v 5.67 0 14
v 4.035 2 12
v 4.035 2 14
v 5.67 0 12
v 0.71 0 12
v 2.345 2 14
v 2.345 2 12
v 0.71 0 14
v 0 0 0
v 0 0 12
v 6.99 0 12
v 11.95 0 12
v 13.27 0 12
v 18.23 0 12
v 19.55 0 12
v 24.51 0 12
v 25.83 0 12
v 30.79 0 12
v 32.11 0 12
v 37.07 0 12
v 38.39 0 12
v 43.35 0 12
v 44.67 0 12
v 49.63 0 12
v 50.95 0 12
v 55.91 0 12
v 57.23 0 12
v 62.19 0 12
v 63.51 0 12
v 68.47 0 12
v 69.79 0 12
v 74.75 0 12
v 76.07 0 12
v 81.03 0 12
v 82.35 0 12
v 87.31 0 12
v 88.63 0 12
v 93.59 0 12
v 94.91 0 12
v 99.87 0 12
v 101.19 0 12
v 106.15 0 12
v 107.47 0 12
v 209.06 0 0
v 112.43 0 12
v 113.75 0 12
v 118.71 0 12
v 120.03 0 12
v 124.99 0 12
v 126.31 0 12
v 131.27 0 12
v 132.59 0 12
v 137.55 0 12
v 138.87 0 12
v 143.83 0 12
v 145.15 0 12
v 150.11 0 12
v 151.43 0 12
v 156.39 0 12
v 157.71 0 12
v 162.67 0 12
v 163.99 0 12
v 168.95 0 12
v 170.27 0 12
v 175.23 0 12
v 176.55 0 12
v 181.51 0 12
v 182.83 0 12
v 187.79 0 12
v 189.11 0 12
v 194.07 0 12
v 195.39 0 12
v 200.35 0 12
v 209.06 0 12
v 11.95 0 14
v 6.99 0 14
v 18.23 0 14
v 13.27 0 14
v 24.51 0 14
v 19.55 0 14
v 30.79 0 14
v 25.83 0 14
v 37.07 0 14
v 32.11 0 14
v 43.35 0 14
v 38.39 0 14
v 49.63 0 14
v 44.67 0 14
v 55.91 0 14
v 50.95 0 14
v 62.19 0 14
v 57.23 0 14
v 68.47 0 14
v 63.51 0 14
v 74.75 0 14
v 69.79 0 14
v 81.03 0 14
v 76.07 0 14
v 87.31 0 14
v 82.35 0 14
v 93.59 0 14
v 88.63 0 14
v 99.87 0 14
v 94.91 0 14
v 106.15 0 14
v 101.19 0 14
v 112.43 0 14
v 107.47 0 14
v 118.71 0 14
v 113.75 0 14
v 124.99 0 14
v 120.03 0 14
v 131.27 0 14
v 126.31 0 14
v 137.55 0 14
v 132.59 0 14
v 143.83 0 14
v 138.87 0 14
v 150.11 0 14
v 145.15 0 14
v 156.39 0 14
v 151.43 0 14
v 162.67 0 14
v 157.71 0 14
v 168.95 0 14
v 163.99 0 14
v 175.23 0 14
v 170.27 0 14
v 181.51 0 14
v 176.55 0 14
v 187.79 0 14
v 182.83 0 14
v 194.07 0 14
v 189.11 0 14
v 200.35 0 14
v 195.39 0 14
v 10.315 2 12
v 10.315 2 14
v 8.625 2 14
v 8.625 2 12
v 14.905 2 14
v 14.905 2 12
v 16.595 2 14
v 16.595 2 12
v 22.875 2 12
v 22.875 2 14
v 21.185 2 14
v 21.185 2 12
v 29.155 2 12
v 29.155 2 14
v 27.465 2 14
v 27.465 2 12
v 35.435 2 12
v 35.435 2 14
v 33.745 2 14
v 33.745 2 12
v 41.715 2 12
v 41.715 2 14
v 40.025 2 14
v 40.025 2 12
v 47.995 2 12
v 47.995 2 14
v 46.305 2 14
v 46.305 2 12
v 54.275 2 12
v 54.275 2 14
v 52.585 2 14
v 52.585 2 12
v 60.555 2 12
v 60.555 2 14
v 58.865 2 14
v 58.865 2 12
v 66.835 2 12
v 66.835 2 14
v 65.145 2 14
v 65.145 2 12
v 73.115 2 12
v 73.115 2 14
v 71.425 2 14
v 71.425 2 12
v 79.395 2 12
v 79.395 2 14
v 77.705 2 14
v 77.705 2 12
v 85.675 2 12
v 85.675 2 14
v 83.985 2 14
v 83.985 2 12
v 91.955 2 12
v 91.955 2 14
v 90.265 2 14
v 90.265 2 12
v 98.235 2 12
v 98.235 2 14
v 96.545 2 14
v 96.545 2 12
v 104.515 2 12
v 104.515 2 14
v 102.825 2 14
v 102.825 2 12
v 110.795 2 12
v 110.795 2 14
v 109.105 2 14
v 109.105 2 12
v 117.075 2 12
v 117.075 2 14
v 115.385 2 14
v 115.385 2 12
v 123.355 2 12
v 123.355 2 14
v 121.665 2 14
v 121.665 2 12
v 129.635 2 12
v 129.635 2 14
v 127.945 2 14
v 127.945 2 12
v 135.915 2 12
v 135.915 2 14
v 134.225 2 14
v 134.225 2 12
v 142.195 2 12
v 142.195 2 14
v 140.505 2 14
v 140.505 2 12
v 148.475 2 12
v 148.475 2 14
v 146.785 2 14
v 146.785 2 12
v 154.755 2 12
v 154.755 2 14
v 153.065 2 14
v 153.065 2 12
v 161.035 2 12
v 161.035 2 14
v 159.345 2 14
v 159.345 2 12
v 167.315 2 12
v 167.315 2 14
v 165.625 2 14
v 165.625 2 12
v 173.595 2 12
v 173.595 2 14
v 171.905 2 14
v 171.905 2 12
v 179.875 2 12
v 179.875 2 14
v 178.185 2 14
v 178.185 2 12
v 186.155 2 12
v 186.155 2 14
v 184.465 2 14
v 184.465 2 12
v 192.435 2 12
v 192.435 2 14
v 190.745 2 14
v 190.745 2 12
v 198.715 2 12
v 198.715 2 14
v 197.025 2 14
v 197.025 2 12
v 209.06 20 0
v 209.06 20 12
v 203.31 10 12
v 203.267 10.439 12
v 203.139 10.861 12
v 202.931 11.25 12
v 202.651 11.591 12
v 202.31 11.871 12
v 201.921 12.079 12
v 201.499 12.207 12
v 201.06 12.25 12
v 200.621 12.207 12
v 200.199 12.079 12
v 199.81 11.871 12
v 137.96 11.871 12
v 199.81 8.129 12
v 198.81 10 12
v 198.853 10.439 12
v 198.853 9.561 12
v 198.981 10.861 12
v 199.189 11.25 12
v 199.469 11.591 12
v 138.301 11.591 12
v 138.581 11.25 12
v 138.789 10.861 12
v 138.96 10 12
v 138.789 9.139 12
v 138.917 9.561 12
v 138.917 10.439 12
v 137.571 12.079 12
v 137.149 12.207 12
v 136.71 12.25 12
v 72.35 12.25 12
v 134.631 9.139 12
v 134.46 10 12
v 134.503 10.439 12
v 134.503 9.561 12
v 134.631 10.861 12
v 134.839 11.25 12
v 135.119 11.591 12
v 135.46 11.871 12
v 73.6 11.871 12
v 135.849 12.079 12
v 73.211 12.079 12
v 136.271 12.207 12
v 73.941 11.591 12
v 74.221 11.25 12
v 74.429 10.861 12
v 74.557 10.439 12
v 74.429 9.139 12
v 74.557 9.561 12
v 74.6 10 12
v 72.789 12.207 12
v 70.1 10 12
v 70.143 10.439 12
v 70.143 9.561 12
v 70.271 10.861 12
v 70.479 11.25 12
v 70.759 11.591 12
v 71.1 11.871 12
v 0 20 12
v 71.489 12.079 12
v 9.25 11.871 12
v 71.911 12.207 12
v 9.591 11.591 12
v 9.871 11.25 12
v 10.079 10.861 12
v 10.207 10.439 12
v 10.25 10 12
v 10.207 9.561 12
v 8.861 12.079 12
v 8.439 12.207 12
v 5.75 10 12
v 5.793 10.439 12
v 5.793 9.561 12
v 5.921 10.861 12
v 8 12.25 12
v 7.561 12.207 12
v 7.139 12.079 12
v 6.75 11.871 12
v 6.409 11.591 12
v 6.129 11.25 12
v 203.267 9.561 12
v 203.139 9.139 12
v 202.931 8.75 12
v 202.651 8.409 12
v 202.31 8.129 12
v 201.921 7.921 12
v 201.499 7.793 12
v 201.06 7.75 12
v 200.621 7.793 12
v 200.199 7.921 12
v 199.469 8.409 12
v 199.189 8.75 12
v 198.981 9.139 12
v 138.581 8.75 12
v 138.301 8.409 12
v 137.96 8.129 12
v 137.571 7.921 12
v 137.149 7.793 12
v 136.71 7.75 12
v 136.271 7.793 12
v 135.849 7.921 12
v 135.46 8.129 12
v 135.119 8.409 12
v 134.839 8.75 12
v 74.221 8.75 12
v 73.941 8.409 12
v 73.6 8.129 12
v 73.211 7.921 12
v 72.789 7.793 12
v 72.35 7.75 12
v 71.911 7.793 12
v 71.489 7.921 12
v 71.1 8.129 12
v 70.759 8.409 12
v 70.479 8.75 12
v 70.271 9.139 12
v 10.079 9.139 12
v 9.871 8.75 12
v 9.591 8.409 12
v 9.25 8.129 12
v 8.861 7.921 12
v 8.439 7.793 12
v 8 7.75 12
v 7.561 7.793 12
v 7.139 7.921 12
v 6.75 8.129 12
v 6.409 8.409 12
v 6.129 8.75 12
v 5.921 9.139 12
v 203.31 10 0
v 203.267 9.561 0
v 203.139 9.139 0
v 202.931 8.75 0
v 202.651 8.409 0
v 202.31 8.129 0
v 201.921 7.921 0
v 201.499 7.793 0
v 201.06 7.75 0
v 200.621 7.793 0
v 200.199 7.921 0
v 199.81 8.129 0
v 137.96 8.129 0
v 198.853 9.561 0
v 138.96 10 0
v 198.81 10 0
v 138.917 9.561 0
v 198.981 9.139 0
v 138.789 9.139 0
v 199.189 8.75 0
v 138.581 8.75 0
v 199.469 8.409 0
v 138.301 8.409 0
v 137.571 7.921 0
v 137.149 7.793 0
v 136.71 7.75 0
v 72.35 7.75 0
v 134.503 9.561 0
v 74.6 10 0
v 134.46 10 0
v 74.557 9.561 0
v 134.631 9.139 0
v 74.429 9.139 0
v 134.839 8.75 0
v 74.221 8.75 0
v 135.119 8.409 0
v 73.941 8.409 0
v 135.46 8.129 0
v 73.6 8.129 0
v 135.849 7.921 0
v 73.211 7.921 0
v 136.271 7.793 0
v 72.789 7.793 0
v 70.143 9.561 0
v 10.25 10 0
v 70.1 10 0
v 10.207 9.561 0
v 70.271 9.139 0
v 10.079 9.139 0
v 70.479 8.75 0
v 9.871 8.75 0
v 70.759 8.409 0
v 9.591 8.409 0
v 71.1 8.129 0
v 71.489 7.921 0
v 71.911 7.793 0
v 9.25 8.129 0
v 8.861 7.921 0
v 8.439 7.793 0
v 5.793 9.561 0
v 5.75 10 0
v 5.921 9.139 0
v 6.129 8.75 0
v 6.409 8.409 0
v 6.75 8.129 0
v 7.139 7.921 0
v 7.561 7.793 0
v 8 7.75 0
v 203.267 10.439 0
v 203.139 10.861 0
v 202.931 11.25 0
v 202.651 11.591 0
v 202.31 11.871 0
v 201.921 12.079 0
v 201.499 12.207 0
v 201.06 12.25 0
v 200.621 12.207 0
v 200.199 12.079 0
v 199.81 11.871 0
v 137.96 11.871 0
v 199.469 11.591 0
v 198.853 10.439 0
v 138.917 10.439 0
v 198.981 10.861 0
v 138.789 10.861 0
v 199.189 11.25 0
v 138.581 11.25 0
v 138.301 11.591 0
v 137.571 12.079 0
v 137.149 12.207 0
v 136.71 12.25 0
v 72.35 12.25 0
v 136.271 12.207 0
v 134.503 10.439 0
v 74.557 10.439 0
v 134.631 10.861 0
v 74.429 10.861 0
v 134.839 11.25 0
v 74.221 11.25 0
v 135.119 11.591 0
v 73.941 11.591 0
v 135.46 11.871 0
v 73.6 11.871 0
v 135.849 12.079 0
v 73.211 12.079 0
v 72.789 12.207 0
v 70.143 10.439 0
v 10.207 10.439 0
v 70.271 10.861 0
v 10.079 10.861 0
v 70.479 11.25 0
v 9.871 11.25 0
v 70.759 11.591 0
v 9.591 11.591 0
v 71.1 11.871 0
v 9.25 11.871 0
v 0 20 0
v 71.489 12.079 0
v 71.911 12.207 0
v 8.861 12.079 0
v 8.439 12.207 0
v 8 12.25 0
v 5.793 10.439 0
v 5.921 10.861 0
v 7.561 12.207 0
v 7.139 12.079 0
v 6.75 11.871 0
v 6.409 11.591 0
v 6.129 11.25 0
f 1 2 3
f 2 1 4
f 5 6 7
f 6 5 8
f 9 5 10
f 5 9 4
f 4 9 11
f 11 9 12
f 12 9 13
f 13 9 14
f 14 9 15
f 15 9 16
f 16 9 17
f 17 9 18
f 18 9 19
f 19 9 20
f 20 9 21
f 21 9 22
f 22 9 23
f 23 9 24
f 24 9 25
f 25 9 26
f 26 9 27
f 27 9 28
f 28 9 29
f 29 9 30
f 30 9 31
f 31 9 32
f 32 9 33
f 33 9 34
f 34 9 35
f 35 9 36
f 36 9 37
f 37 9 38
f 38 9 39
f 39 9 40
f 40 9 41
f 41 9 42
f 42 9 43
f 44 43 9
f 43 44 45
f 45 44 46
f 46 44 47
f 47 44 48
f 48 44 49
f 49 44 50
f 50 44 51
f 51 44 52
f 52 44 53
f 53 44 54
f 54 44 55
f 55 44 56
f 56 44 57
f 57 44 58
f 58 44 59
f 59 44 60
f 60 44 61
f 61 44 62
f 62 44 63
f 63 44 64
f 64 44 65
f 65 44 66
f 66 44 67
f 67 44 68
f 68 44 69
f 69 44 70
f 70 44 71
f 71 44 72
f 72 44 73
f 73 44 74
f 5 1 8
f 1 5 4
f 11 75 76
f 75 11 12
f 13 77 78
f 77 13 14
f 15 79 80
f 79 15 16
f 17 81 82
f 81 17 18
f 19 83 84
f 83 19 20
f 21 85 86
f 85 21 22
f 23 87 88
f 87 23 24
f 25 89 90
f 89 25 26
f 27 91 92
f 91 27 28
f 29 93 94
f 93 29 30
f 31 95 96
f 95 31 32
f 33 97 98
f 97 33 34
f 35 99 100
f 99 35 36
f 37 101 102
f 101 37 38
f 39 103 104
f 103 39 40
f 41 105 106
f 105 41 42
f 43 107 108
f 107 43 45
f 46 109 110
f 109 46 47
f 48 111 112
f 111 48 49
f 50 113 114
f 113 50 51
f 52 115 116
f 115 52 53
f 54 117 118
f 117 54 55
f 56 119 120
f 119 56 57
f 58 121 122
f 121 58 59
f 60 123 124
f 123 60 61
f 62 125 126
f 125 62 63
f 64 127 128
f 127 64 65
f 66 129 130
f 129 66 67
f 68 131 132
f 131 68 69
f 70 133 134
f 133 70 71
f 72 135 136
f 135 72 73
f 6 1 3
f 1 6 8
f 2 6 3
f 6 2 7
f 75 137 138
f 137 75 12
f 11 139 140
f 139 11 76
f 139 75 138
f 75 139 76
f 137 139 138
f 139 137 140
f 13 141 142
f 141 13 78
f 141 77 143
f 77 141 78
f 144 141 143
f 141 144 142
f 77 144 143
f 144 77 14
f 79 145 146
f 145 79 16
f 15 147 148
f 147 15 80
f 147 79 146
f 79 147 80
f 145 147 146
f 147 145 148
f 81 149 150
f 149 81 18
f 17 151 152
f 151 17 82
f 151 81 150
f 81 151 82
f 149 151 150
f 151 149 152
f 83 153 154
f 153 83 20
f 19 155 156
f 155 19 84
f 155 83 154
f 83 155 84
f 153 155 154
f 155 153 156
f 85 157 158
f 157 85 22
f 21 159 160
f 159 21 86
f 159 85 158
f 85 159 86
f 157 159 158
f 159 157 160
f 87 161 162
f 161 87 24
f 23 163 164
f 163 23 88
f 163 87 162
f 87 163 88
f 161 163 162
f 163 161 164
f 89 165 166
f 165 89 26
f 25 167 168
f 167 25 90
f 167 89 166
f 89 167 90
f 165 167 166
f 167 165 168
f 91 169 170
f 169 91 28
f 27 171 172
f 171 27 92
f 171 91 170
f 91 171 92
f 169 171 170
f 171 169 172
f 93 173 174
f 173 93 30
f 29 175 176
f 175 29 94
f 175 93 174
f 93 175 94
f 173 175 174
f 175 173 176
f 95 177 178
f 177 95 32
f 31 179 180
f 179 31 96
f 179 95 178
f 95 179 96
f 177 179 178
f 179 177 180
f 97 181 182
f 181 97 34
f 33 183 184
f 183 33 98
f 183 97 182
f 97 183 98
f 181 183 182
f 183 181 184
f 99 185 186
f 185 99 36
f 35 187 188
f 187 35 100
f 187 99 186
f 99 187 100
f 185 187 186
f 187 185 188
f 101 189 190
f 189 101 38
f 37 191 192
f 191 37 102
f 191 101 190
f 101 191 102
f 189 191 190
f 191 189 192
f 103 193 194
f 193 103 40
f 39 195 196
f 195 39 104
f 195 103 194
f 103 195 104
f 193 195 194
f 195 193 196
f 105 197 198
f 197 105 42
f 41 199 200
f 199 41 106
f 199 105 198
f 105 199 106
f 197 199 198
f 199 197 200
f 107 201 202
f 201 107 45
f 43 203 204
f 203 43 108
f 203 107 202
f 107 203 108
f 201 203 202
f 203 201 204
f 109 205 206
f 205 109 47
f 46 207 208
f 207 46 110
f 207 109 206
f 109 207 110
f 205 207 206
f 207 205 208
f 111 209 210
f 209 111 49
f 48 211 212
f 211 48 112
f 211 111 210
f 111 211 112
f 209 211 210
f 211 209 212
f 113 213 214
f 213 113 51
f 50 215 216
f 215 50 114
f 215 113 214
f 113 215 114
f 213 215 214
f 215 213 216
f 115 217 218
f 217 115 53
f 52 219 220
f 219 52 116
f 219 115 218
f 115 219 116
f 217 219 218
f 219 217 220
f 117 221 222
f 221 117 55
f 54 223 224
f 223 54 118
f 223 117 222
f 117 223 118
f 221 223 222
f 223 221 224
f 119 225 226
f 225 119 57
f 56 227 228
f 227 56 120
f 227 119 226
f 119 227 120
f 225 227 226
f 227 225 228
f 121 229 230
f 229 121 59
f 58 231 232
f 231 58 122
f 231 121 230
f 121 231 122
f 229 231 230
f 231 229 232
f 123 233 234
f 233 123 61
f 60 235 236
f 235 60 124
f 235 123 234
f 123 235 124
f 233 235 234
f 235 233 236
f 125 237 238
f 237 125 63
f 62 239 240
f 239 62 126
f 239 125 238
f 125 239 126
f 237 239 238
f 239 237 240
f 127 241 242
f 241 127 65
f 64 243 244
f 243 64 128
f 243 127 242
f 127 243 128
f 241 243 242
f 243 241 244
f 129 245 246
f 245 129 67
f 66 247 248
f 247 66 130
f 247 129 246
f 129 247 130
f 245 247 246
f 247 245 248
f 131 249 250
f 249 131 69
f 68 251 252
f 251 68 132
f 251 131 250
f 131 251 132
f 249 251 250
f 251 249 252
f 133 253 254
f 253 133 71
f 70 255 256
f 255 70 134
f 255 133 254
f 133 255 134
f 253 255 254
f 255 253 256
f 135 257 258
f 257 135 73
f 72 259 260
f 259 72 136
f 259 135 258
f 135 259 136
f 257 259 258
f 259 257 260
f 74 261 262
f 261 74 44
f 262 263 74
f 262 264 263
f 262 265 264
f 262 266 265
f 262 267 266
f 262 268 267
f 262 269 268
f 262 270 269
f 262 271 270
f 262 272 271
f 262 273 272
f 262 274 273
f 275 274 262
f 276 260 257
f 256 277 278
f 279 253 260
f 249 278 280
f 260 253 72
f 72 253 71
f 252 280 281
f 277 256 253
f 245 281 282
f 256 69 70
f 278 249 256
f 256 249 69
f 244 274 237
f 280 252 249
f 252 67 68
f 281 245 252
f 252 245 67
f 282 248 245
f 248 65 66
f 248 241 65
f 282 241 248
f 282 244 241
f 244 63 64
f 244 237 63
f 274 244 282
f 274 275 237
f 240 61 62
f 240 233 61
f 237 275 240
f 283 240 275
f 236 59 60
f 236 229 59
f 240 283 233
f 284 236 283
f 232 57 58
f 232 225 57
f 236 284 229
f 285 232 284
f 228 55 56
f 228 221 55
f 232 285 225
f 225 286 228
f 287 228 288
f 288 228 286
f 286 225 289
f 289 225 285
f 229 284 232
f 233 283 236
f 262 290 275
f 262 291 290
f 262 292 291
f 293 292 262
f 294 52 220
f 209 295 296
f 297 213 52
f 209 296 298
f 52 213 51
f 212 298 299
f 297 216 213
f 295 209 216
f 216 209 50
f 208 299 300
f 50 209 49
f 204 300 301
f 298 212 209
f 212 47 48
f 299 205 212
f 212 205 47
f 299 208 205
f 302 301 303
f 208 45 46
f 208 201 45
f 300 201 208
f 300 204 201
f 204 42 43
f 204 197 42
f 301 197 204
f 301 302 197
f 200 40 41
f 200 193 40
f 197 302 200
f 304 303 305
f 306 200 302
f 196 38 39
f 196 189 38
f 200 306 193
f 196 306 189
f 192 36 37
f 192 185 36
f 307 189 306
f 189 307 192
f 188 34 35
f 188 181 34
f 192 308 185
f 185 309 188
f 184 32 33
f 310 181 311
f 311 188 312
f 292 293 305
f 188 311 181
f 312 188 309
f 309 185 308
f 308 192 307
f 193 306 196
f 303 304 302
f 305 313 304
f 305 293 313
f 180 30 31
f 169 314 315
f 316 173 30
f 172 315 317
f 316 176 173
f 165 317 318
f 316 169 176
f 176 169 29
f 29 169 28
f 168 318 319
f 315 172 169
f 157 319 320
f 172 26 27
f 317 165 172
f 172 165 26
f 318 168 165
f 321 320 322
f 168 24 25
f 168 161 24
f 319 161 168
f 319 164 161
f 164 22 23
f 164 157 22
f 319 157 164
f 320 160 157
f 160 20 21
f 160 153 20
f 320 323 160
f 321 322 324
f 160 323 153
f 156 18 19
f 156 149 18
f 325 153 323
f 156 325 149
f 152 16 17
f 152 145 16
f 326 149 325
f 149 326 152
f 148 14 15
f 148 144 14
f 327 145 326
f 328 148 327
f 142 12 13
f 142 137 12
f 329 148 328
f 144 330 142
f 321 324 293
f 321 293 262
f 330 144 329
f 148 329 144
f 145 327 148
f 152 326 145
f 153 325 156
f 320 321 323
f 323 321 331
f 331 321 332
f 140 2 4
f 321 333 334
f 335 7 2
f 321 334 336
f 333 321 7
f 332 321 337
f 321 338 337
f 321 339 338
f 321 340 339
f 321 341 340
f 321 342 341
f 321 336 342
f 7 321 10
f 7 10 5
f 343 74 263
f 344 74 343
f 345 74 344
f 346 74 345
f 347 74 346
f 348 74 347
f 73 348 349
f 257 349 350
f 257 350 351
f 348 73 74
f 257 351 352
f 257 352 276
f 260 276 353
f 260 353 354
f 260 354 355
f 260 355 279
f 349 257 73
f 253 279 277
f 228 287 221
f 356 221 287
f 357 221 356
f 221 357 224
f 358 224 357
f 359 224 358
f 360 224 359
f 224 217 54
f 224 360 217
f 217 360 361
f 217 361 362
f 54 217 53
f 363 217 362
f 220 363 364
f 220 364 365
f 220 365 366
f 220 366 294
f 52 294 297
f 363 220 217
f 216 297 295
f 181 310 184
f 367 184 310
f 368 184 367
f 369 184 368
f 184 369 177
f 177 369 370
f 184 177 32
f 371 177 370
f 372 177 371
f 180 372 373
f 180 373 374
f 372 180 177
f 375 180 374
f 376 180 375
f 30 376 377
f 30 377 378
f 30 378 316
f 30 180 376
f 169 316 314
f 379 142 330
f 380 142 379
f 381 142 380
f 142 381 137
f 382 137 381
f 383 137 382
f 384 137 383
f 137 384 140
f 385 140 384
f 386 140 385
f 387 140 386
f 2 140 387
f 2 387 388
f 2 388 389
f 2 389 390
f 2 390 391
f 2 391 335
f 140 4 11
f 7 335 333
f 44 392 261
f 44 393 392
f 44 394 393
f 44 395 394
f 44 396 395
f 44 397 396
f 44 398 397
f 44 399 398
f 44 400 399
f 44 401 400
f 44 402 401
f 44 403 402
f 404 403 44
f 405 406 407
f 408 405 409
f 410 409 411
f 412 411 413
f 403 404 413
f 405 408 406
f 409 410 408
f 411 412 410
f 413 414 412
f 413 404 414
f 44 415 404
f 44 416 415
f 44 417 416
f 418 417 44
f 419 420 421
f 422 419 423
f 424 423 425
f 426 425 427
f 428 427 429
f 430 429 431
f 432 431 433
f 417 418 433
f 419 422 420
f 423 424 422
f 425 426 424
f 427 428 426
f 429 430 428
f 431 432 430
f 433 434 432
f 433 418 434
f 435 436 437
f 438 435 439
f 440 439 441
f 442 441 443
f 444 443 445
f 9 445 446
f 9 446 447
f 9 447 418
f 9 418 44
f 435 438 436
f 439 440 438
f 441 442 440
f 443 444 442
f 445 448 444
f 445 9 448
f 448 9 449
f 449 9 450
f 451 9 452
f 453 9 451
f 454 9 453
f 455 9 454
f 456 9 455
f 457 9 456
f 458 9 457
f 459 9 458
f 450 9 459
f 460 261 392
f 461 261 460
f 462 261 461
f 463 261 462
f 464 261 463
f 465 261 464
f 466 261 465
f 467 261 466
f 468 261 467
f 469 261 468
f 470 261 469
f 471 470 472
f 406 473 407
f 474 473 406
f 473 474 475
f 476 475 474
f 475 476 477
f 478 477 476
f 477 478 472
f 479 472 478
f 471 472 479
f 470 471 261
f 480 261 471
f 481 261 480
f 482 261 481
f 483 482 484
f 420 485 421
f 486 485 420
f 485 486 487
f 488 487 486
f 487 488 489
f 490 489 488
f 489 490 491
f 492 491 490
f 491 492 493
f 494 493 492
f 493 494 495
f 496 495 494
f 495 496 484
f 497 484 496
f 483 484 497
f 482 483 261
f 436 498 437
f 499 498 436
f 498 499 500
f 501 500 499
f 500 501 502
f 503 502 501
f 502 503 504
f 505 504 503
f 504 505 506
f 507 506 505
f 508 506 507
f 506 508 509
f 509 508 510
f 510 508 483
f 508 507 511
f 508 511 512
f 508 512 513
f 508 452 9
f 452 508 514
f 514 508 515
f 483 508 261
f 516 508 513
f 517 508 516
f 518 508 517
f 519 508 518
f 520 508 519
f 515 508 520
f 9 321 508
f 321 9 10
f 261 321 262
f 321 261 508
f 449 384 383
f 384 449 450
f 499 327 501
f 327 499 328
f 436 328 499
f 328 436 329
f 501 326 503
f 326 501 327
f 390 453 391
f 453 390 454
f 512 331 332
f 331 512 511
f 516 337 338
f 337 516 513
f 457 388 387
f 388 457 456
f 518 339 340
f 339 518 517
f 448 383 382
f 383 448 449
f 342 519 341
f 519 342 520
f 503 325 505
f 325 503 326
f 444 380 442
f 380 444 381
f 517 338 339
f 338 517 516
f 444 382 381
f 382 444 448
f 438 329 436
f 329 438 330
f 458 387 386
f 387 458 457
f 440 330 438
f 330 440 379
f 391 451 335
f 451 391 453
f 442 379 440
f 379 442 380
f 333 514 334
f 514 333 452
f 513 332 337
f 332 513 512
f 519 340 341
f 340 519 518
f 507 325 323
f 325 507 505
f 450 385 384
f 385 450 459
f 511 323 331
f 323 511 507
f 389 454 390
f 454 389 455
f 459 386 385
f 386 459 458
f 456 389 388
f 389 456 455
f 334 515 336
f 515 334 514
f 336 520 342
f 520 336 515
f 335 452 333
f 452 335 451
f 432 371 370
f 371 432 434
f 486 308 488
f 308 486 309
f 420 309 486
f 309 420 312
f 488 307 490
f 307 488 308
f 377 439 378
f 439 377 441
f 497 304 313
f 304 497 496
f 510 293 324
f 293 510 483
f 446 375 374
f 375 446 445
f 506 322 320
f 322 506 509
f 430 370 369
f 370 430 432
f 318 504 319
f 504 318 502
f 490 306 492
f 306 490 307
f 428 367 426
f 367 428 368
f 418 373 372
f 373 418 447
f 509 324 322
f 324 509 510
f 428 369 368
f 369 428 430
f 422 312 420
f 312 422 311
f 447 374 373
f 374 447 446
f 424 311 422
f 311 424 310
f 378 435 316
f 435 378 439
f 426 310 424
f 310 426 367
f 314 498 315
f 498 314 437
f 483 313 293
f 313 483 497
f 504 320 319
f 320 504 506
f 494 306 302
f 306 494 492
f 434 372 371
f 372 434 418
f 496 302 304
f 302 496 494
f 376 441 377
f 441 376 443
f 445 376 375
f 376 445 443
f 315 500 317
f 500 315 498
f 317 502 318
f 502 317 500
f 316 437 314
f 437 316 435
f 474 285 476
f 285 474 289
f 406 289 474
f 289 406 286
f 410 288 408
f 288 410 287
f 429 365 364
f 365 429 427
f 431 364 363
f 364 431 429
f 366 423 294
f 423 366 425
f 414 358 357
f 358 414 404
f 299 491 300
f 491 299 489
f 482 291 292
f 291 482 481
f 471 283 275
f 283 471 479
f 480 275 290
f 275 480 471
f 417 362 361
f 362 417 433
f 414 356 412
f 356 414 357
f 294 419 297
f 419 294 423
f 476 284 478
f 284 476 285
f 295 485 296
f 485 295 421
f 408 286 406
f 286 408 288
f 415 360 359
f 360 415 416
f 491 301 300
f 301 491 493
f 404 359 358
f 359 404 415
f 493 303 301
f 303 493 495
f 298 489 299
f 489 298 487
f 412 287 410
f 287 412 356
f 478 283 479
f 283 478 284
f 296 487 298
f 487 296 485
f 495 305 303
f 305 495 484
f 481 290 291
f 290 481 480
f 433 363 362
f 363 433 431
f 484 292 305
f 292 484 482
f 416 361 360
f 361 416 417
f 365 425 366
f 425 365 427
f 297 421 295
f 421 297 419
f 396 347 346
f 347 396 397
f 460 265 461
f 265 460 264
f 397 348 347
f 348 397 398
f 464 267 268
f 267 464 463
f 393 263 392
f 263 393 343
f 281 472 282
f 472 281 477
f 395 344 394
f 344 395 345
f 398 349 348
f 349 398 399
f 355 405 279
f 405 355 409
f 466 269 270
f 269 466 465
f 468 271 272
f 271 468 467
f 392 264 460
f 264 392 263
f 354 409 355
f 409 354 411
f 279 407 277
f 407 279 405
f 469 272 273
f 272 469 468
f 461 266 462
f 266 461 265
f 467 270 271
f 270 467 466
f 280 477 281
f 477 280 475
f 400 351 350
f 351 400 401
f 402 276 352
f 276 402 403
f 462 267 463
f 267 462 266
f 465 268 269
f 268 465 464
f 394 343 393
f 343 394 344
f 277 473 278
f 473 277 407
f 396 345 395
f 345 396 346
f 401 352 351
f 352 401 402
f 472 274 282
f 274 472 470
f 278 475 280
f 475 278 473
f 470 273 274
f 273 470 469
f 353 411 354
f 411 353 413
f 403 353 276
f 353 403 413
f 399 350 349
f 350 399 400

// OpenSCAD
$fn = 32;

// ----------------------------------------------------------------------
// Gear rack: m=2 z=32, 209.06 x 20 x 14 mm
// ----------------------------------------------------------------------

// --- parameters (mm) ---
length = 209.06;          // rack length, X
width = 20;               // rack width, Y
height = 14;              // overall height, Z
module_m = 2;             // module
back_t = 12;              // tooth root line height
pitch = 6.28;             // circular pitch
tip_w = 1.69;             // tooth thickness at the tip
root_w = 4.96;            // tooth thickness at the root line
hole_d = 4.5;             // mounting hole
sink = 0.6;               // tooth root overlap into the body

tooth_span = 201.06;

module tooth(x0) {
  /* 20 deg flank profile, sunk into the body for a positive overlap */
  translate([x0, 0, back_t - sink])
    linear_extrude(height = height - back_t + sink)
      polygon(points = [[-root_w / 2, 0], [root_w / 2, 0],
                        [tip_w / 2, height - back_t],
                        [-tip_w / 2, height - back_t]]);
}

difference() {
  union() {
    cube([length, width, back_t]);
    for (i = [0 : 32 - 1])
      tooth((i + 0.5) * pitch + (tooth_span - 32 * pitch) / 2);
  }
  translate([8, 10, -1]) cylinder(h = back_t + 2, d = hole_d);
  translate([72.35, 10, -1]) cylinder(h = back_t + 2, d = hole_d);
  translate([136.71, 10, -1]) cylinder(h = back_t + 2, d = hole_d);
  translate([201.06, 10, -1]) cylinder(h = back_t + 2, d = hole_d);
}
